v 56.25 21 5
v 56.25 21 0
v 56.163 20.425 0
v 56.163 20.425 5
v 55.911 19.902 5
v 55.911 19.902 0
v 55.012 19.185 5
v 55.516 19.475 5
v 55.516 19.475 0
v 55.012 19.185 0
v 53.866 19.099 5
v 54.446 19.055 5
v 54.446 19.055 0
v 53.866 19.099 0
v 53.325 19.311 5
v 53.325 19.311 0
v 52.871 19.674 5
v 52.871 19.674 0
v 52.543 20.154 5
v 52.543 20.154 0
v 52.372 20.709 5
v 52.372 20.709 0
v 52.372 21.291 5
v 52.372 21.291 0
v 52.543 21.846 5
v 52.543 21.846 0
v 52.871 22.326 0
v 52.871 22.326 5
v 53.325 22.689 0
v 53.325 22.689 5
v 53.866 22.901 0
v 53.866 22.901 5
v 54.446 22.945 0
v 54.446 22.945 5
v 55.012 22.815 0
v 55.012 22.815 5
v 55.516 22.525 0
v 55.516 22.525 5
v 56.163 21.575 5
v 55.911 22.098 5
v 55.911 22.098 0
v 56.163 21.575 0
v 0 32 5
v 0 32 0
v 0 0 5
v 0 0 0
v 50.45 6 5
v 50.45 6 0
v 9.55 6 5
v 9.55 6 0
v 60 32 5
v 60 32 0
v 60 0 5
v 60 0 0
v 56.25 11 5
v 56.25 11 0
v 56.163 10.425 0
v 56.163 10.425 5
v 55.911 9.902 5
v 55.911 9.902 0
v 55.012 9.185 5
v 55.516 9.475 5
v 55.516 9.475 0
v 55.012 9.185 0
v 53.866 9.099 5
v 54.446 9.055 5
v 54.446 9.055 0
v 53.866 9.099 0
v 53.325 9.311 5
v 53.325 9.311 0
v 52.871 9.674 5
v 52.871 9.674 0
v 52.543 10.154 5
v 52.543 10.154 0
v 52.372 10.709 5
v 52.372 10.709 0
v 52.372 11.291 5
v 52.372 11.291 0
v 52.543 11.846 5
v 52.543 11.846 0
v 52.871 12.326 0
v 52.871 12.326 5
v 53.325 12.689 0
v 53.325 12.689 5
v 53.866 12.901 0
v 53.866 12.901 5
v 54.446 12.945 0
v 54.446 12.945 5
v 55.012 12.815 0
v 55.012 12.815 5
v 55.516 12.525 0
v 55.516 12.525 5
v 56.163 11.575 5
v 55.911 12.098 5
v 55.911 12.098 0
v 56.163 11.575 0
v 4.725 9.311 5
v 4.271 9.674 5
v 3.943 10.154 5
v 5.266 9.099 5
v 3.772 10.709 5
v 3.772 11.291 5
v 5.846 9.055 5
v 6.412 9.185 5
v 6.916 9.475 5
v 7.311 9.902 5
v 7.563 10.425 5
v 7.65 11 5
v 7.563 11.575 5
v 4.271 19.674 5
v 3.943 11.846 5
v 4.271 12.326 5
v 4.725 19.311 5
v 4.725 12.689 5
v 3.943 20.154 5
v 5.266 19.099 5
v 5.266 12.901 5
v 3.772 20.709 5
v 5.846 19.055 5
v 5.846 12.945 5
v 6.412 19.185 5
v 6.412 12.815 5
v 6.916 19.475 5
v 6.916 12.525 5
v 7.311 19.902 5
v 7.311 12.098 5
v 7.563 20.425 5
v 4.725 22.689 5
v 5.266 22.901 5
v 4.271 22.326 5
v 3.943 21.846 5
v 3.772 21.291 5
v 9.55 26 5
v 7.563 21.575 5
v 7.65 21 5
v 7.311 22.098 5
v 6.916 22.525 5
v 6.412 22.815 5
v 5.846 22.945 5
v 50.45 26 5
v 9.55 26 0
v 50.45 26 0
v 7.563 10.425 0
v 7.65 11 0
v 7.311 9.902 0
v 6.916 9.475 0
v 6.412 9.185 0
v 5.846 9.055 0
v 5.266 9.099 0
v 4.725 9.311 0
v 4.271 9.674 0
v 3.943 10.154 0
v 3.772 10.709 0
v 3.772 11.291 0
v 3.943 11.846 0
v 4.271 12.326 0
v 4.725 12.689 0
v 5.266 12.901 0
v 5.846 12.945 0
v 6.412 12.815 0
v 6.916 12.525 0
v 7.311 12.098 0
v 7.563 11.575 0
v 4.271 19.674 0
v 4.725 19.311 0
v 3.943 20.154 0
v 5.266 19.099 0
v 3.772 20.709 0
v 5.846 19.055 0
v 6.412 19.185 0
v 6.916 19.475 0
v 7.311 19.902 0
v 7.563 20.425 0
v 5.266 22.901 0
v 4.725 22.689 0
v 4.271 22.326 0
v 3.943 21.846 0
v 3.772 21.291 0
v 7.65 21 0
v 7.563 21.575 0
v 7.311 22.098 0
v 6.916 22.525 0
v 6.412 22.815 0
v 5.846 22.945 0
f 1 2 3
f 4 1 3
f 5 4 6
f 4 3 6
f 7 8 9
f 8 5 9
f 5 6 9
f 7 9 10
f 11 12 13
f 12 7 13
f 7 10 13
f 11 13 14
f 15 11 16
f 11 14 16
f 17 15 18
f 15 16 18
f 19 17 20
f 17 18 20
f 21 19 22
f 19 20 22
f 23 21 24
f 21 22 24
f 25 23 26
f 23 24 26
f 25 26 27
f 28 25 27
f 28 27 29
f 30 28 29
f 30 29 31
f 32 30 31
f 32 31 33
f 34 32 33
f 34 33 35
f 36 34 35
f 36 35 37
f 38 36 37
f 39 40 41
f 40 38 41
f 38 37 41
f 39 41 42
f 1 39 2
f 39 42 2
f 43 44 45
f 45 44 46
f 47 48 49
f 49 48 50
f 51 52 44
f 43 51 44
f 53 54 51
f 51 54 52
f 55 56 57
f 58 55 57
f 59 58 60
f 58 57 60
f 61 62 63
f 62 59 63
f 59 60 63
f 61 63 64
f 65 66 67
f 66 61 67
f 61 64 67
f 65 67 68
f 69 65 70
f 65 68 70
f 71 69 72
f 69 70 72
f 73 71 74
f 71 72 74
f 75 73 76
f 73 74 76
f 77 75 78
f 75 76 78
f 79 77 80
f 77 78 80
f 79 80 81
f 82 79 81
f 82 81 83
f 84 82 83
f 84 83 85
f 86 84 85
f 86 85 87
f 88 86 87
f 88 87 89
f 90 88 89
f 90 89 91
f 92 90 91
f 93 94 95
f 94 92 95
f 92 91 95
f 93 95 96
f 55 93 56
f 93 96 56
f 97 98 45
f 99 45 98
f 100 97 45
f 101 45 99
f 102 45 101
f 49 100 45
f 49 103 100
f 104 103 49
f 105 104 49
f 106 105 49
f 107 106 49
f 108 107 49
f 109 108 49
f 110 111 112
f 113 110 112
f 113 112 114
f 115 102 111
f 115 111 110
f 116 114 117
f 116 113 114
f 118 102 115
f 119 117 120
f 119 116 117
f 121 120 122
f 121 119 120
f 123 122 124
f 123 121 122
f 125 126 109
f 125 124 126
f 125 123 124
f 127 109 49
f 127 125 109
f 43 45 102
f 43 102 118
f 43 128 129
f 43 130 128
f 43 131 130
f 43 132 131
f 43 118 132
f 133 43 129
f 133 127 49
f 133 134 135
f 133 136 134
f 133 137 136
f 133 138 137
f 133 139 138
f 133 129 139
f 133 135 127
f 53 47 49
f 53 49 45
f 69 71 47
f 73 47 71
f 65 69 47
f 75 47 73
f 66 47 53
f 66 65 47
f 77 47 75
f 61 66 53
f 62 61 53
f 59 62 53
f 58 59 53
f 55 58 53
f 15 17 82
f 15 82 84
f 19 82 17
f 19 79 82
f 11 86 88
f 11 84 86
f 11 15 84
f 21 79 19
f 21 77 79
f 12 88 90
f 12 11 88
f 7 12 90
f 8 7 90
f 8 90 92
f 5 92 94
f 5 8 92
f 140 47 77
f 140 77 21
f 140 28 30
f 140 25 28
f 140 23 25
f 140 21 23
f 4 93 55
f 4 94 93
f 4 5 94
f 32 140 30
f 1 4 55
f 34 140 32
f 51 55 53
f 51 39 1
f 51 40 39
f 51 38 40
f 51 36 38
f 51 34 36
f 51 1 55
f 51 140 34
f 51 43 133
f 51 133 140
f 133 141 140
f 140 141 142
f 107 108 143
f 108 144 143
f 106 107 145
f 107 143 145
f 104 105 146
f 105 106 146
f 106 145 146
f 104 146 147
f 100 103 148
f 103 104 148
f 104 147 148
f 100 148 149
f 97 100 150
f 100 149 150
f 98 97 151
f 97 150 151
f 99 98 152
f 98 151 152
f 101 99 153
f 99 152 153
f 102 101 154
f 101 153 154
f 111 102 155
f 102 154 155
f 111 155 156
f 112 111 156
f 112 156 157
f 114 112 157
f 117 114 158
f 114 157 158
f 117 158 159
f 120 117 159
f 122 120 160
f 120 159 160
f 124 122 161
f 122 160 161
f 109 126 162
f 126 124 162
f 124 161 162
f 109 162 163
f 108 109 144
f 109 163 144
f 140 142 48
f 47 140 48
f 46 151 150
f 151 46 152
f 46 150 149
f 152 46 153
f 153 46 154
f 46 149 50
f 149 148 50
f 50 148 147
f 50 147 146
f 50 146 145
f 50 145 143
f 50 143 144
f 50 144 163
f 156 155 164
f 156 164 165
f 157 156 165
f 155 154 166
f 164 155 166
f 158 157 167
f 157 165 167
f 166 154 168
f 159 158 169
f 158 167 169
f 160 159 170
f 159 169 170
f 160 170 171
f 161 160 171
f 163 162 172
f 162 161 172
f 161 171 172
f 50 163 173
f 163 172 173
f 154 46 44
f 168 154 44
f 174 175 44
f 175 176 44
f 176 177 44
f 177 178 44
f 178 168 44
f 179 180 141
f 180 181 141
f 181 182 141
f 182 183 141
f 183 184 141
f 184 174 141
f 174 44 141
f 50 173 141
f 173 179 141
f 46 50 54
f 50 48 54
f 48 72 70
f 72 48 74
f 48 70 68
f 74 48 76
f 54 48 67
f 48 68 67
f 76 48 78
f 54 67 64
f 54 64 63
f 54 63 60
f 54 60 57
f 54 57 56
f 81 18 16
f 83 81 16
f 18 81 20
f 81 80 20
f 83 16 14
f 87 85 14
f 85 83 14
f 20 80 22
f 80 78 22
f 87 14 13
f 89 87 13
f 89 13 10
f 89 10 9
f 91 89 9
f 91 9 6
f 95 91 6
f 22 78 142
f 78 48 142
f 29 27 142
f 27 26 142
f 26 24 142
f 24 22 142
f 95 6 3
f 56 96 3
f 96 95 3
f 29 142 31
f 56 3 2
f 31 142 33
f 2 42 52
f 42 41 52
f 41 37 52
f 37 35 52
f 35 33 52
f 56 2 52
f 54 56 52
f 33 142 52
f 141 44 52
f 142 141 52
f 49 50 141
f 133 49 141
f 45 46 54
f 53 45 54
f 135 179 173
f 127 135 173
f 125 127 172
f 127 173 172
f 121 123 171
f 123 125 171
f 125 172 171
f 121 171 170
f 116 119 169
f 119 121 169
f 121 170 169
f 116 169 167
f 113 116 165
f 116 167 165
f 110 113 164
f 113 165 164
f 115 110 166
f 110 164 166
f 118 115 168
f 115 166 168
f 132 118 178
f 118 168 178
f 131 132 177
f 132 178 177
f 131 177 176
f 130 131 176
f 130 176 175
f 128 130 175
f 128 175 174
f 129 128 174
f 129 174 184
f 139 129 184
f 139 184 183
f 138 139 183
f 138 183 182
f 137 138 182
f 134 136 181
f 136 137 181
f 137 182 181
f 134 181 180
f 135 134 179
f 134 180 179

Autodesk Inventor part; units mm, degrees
ref_plane "YZ Plane" through (0, 0, 0) normal (1, 0, 0) x (0, 1, 0)
ref_plane "XZ Plane" through (0, 0, 0) normal (0, 1, 0) x (-1, 0, 0)
ref_plane "XY Plane" through (0, 0, 0) normal (0, 0, 1) x (1, 0, 0)
sketch "スケッチ2" plane through (0, 0, 0) normal (0, 0, 1) x (1, 0, 0)
  line L0 (0, 0) -> (60, 0)
  line L1 (60, 0) -> (60, 32)
  line L2 (60, 32) -> (0, 32)
  line L3 (0, 32) -> (0, 0)
  line L4 (3, 26) -> (57, 26)
  line L5 (57, 26) -> (57, 6)
  line L6 (57, 6) -> (3, 6)
  line L7 (3, 6) -> (3, 26)
  circle A0 centre (5.7, 21) radius 1.95
  circle A1 centre (5.7, 11) radius 1.95
  circle A2 centre (54.3, 21) radius 1.95
  circle A3 centre (54.3, 11) radius 1.95
  line L8 (9.55, 26) -> (50.45, 26)
  line L9 (50.45, 26) -> (50.45, 6)
  line L10 (50.45, 6) -> (9.55, 6)
  line L11 (9.55, 6) -> (9.55, 26)
  point P0 (30, 0)
  point P1 (9.55, 6)
  dimension "d78" = 20
  dimension "d79" = 3.9
  dimension "d80" = 3.9
  dimension "d81" = 3.9
  dimension "d82" = 3.9
  dimension "d83" = 48.6
  dimension "d84" = 54
  dimension "d85" = 2.7
  dimension "d86" = 2.7
  dimension "d87" = 48.6
  dimension "d88" = 10
  dimension "d89" = 5
  dimension "d90" = 10
  dimension "d91" = 5
  dimension "d92" = 60
  dimension "d93" = 3
  dimension "d94" = 40.9
  dimension "d95" = 6.55
  dimension "d96" = 6.55
  dimension "d97" = 32
  dimension "d98" = 6
extrude "押し出し2" add sketch "スケッチ2" along normal blind 5 contours L3 L2 L1 L0 | L4 L11 L6 L7 | L4 L5 L6 L9
equation "\"d80\" = d79"
equation "\"d81\" = d79"
equation "\"d82\" = d79"
equation "\"d86\" = d85"
equation "\"d87\" = d83"
equation "\"d90\" = d88"
equation "\"d91\" = d89"
properties part number "servo_case"
